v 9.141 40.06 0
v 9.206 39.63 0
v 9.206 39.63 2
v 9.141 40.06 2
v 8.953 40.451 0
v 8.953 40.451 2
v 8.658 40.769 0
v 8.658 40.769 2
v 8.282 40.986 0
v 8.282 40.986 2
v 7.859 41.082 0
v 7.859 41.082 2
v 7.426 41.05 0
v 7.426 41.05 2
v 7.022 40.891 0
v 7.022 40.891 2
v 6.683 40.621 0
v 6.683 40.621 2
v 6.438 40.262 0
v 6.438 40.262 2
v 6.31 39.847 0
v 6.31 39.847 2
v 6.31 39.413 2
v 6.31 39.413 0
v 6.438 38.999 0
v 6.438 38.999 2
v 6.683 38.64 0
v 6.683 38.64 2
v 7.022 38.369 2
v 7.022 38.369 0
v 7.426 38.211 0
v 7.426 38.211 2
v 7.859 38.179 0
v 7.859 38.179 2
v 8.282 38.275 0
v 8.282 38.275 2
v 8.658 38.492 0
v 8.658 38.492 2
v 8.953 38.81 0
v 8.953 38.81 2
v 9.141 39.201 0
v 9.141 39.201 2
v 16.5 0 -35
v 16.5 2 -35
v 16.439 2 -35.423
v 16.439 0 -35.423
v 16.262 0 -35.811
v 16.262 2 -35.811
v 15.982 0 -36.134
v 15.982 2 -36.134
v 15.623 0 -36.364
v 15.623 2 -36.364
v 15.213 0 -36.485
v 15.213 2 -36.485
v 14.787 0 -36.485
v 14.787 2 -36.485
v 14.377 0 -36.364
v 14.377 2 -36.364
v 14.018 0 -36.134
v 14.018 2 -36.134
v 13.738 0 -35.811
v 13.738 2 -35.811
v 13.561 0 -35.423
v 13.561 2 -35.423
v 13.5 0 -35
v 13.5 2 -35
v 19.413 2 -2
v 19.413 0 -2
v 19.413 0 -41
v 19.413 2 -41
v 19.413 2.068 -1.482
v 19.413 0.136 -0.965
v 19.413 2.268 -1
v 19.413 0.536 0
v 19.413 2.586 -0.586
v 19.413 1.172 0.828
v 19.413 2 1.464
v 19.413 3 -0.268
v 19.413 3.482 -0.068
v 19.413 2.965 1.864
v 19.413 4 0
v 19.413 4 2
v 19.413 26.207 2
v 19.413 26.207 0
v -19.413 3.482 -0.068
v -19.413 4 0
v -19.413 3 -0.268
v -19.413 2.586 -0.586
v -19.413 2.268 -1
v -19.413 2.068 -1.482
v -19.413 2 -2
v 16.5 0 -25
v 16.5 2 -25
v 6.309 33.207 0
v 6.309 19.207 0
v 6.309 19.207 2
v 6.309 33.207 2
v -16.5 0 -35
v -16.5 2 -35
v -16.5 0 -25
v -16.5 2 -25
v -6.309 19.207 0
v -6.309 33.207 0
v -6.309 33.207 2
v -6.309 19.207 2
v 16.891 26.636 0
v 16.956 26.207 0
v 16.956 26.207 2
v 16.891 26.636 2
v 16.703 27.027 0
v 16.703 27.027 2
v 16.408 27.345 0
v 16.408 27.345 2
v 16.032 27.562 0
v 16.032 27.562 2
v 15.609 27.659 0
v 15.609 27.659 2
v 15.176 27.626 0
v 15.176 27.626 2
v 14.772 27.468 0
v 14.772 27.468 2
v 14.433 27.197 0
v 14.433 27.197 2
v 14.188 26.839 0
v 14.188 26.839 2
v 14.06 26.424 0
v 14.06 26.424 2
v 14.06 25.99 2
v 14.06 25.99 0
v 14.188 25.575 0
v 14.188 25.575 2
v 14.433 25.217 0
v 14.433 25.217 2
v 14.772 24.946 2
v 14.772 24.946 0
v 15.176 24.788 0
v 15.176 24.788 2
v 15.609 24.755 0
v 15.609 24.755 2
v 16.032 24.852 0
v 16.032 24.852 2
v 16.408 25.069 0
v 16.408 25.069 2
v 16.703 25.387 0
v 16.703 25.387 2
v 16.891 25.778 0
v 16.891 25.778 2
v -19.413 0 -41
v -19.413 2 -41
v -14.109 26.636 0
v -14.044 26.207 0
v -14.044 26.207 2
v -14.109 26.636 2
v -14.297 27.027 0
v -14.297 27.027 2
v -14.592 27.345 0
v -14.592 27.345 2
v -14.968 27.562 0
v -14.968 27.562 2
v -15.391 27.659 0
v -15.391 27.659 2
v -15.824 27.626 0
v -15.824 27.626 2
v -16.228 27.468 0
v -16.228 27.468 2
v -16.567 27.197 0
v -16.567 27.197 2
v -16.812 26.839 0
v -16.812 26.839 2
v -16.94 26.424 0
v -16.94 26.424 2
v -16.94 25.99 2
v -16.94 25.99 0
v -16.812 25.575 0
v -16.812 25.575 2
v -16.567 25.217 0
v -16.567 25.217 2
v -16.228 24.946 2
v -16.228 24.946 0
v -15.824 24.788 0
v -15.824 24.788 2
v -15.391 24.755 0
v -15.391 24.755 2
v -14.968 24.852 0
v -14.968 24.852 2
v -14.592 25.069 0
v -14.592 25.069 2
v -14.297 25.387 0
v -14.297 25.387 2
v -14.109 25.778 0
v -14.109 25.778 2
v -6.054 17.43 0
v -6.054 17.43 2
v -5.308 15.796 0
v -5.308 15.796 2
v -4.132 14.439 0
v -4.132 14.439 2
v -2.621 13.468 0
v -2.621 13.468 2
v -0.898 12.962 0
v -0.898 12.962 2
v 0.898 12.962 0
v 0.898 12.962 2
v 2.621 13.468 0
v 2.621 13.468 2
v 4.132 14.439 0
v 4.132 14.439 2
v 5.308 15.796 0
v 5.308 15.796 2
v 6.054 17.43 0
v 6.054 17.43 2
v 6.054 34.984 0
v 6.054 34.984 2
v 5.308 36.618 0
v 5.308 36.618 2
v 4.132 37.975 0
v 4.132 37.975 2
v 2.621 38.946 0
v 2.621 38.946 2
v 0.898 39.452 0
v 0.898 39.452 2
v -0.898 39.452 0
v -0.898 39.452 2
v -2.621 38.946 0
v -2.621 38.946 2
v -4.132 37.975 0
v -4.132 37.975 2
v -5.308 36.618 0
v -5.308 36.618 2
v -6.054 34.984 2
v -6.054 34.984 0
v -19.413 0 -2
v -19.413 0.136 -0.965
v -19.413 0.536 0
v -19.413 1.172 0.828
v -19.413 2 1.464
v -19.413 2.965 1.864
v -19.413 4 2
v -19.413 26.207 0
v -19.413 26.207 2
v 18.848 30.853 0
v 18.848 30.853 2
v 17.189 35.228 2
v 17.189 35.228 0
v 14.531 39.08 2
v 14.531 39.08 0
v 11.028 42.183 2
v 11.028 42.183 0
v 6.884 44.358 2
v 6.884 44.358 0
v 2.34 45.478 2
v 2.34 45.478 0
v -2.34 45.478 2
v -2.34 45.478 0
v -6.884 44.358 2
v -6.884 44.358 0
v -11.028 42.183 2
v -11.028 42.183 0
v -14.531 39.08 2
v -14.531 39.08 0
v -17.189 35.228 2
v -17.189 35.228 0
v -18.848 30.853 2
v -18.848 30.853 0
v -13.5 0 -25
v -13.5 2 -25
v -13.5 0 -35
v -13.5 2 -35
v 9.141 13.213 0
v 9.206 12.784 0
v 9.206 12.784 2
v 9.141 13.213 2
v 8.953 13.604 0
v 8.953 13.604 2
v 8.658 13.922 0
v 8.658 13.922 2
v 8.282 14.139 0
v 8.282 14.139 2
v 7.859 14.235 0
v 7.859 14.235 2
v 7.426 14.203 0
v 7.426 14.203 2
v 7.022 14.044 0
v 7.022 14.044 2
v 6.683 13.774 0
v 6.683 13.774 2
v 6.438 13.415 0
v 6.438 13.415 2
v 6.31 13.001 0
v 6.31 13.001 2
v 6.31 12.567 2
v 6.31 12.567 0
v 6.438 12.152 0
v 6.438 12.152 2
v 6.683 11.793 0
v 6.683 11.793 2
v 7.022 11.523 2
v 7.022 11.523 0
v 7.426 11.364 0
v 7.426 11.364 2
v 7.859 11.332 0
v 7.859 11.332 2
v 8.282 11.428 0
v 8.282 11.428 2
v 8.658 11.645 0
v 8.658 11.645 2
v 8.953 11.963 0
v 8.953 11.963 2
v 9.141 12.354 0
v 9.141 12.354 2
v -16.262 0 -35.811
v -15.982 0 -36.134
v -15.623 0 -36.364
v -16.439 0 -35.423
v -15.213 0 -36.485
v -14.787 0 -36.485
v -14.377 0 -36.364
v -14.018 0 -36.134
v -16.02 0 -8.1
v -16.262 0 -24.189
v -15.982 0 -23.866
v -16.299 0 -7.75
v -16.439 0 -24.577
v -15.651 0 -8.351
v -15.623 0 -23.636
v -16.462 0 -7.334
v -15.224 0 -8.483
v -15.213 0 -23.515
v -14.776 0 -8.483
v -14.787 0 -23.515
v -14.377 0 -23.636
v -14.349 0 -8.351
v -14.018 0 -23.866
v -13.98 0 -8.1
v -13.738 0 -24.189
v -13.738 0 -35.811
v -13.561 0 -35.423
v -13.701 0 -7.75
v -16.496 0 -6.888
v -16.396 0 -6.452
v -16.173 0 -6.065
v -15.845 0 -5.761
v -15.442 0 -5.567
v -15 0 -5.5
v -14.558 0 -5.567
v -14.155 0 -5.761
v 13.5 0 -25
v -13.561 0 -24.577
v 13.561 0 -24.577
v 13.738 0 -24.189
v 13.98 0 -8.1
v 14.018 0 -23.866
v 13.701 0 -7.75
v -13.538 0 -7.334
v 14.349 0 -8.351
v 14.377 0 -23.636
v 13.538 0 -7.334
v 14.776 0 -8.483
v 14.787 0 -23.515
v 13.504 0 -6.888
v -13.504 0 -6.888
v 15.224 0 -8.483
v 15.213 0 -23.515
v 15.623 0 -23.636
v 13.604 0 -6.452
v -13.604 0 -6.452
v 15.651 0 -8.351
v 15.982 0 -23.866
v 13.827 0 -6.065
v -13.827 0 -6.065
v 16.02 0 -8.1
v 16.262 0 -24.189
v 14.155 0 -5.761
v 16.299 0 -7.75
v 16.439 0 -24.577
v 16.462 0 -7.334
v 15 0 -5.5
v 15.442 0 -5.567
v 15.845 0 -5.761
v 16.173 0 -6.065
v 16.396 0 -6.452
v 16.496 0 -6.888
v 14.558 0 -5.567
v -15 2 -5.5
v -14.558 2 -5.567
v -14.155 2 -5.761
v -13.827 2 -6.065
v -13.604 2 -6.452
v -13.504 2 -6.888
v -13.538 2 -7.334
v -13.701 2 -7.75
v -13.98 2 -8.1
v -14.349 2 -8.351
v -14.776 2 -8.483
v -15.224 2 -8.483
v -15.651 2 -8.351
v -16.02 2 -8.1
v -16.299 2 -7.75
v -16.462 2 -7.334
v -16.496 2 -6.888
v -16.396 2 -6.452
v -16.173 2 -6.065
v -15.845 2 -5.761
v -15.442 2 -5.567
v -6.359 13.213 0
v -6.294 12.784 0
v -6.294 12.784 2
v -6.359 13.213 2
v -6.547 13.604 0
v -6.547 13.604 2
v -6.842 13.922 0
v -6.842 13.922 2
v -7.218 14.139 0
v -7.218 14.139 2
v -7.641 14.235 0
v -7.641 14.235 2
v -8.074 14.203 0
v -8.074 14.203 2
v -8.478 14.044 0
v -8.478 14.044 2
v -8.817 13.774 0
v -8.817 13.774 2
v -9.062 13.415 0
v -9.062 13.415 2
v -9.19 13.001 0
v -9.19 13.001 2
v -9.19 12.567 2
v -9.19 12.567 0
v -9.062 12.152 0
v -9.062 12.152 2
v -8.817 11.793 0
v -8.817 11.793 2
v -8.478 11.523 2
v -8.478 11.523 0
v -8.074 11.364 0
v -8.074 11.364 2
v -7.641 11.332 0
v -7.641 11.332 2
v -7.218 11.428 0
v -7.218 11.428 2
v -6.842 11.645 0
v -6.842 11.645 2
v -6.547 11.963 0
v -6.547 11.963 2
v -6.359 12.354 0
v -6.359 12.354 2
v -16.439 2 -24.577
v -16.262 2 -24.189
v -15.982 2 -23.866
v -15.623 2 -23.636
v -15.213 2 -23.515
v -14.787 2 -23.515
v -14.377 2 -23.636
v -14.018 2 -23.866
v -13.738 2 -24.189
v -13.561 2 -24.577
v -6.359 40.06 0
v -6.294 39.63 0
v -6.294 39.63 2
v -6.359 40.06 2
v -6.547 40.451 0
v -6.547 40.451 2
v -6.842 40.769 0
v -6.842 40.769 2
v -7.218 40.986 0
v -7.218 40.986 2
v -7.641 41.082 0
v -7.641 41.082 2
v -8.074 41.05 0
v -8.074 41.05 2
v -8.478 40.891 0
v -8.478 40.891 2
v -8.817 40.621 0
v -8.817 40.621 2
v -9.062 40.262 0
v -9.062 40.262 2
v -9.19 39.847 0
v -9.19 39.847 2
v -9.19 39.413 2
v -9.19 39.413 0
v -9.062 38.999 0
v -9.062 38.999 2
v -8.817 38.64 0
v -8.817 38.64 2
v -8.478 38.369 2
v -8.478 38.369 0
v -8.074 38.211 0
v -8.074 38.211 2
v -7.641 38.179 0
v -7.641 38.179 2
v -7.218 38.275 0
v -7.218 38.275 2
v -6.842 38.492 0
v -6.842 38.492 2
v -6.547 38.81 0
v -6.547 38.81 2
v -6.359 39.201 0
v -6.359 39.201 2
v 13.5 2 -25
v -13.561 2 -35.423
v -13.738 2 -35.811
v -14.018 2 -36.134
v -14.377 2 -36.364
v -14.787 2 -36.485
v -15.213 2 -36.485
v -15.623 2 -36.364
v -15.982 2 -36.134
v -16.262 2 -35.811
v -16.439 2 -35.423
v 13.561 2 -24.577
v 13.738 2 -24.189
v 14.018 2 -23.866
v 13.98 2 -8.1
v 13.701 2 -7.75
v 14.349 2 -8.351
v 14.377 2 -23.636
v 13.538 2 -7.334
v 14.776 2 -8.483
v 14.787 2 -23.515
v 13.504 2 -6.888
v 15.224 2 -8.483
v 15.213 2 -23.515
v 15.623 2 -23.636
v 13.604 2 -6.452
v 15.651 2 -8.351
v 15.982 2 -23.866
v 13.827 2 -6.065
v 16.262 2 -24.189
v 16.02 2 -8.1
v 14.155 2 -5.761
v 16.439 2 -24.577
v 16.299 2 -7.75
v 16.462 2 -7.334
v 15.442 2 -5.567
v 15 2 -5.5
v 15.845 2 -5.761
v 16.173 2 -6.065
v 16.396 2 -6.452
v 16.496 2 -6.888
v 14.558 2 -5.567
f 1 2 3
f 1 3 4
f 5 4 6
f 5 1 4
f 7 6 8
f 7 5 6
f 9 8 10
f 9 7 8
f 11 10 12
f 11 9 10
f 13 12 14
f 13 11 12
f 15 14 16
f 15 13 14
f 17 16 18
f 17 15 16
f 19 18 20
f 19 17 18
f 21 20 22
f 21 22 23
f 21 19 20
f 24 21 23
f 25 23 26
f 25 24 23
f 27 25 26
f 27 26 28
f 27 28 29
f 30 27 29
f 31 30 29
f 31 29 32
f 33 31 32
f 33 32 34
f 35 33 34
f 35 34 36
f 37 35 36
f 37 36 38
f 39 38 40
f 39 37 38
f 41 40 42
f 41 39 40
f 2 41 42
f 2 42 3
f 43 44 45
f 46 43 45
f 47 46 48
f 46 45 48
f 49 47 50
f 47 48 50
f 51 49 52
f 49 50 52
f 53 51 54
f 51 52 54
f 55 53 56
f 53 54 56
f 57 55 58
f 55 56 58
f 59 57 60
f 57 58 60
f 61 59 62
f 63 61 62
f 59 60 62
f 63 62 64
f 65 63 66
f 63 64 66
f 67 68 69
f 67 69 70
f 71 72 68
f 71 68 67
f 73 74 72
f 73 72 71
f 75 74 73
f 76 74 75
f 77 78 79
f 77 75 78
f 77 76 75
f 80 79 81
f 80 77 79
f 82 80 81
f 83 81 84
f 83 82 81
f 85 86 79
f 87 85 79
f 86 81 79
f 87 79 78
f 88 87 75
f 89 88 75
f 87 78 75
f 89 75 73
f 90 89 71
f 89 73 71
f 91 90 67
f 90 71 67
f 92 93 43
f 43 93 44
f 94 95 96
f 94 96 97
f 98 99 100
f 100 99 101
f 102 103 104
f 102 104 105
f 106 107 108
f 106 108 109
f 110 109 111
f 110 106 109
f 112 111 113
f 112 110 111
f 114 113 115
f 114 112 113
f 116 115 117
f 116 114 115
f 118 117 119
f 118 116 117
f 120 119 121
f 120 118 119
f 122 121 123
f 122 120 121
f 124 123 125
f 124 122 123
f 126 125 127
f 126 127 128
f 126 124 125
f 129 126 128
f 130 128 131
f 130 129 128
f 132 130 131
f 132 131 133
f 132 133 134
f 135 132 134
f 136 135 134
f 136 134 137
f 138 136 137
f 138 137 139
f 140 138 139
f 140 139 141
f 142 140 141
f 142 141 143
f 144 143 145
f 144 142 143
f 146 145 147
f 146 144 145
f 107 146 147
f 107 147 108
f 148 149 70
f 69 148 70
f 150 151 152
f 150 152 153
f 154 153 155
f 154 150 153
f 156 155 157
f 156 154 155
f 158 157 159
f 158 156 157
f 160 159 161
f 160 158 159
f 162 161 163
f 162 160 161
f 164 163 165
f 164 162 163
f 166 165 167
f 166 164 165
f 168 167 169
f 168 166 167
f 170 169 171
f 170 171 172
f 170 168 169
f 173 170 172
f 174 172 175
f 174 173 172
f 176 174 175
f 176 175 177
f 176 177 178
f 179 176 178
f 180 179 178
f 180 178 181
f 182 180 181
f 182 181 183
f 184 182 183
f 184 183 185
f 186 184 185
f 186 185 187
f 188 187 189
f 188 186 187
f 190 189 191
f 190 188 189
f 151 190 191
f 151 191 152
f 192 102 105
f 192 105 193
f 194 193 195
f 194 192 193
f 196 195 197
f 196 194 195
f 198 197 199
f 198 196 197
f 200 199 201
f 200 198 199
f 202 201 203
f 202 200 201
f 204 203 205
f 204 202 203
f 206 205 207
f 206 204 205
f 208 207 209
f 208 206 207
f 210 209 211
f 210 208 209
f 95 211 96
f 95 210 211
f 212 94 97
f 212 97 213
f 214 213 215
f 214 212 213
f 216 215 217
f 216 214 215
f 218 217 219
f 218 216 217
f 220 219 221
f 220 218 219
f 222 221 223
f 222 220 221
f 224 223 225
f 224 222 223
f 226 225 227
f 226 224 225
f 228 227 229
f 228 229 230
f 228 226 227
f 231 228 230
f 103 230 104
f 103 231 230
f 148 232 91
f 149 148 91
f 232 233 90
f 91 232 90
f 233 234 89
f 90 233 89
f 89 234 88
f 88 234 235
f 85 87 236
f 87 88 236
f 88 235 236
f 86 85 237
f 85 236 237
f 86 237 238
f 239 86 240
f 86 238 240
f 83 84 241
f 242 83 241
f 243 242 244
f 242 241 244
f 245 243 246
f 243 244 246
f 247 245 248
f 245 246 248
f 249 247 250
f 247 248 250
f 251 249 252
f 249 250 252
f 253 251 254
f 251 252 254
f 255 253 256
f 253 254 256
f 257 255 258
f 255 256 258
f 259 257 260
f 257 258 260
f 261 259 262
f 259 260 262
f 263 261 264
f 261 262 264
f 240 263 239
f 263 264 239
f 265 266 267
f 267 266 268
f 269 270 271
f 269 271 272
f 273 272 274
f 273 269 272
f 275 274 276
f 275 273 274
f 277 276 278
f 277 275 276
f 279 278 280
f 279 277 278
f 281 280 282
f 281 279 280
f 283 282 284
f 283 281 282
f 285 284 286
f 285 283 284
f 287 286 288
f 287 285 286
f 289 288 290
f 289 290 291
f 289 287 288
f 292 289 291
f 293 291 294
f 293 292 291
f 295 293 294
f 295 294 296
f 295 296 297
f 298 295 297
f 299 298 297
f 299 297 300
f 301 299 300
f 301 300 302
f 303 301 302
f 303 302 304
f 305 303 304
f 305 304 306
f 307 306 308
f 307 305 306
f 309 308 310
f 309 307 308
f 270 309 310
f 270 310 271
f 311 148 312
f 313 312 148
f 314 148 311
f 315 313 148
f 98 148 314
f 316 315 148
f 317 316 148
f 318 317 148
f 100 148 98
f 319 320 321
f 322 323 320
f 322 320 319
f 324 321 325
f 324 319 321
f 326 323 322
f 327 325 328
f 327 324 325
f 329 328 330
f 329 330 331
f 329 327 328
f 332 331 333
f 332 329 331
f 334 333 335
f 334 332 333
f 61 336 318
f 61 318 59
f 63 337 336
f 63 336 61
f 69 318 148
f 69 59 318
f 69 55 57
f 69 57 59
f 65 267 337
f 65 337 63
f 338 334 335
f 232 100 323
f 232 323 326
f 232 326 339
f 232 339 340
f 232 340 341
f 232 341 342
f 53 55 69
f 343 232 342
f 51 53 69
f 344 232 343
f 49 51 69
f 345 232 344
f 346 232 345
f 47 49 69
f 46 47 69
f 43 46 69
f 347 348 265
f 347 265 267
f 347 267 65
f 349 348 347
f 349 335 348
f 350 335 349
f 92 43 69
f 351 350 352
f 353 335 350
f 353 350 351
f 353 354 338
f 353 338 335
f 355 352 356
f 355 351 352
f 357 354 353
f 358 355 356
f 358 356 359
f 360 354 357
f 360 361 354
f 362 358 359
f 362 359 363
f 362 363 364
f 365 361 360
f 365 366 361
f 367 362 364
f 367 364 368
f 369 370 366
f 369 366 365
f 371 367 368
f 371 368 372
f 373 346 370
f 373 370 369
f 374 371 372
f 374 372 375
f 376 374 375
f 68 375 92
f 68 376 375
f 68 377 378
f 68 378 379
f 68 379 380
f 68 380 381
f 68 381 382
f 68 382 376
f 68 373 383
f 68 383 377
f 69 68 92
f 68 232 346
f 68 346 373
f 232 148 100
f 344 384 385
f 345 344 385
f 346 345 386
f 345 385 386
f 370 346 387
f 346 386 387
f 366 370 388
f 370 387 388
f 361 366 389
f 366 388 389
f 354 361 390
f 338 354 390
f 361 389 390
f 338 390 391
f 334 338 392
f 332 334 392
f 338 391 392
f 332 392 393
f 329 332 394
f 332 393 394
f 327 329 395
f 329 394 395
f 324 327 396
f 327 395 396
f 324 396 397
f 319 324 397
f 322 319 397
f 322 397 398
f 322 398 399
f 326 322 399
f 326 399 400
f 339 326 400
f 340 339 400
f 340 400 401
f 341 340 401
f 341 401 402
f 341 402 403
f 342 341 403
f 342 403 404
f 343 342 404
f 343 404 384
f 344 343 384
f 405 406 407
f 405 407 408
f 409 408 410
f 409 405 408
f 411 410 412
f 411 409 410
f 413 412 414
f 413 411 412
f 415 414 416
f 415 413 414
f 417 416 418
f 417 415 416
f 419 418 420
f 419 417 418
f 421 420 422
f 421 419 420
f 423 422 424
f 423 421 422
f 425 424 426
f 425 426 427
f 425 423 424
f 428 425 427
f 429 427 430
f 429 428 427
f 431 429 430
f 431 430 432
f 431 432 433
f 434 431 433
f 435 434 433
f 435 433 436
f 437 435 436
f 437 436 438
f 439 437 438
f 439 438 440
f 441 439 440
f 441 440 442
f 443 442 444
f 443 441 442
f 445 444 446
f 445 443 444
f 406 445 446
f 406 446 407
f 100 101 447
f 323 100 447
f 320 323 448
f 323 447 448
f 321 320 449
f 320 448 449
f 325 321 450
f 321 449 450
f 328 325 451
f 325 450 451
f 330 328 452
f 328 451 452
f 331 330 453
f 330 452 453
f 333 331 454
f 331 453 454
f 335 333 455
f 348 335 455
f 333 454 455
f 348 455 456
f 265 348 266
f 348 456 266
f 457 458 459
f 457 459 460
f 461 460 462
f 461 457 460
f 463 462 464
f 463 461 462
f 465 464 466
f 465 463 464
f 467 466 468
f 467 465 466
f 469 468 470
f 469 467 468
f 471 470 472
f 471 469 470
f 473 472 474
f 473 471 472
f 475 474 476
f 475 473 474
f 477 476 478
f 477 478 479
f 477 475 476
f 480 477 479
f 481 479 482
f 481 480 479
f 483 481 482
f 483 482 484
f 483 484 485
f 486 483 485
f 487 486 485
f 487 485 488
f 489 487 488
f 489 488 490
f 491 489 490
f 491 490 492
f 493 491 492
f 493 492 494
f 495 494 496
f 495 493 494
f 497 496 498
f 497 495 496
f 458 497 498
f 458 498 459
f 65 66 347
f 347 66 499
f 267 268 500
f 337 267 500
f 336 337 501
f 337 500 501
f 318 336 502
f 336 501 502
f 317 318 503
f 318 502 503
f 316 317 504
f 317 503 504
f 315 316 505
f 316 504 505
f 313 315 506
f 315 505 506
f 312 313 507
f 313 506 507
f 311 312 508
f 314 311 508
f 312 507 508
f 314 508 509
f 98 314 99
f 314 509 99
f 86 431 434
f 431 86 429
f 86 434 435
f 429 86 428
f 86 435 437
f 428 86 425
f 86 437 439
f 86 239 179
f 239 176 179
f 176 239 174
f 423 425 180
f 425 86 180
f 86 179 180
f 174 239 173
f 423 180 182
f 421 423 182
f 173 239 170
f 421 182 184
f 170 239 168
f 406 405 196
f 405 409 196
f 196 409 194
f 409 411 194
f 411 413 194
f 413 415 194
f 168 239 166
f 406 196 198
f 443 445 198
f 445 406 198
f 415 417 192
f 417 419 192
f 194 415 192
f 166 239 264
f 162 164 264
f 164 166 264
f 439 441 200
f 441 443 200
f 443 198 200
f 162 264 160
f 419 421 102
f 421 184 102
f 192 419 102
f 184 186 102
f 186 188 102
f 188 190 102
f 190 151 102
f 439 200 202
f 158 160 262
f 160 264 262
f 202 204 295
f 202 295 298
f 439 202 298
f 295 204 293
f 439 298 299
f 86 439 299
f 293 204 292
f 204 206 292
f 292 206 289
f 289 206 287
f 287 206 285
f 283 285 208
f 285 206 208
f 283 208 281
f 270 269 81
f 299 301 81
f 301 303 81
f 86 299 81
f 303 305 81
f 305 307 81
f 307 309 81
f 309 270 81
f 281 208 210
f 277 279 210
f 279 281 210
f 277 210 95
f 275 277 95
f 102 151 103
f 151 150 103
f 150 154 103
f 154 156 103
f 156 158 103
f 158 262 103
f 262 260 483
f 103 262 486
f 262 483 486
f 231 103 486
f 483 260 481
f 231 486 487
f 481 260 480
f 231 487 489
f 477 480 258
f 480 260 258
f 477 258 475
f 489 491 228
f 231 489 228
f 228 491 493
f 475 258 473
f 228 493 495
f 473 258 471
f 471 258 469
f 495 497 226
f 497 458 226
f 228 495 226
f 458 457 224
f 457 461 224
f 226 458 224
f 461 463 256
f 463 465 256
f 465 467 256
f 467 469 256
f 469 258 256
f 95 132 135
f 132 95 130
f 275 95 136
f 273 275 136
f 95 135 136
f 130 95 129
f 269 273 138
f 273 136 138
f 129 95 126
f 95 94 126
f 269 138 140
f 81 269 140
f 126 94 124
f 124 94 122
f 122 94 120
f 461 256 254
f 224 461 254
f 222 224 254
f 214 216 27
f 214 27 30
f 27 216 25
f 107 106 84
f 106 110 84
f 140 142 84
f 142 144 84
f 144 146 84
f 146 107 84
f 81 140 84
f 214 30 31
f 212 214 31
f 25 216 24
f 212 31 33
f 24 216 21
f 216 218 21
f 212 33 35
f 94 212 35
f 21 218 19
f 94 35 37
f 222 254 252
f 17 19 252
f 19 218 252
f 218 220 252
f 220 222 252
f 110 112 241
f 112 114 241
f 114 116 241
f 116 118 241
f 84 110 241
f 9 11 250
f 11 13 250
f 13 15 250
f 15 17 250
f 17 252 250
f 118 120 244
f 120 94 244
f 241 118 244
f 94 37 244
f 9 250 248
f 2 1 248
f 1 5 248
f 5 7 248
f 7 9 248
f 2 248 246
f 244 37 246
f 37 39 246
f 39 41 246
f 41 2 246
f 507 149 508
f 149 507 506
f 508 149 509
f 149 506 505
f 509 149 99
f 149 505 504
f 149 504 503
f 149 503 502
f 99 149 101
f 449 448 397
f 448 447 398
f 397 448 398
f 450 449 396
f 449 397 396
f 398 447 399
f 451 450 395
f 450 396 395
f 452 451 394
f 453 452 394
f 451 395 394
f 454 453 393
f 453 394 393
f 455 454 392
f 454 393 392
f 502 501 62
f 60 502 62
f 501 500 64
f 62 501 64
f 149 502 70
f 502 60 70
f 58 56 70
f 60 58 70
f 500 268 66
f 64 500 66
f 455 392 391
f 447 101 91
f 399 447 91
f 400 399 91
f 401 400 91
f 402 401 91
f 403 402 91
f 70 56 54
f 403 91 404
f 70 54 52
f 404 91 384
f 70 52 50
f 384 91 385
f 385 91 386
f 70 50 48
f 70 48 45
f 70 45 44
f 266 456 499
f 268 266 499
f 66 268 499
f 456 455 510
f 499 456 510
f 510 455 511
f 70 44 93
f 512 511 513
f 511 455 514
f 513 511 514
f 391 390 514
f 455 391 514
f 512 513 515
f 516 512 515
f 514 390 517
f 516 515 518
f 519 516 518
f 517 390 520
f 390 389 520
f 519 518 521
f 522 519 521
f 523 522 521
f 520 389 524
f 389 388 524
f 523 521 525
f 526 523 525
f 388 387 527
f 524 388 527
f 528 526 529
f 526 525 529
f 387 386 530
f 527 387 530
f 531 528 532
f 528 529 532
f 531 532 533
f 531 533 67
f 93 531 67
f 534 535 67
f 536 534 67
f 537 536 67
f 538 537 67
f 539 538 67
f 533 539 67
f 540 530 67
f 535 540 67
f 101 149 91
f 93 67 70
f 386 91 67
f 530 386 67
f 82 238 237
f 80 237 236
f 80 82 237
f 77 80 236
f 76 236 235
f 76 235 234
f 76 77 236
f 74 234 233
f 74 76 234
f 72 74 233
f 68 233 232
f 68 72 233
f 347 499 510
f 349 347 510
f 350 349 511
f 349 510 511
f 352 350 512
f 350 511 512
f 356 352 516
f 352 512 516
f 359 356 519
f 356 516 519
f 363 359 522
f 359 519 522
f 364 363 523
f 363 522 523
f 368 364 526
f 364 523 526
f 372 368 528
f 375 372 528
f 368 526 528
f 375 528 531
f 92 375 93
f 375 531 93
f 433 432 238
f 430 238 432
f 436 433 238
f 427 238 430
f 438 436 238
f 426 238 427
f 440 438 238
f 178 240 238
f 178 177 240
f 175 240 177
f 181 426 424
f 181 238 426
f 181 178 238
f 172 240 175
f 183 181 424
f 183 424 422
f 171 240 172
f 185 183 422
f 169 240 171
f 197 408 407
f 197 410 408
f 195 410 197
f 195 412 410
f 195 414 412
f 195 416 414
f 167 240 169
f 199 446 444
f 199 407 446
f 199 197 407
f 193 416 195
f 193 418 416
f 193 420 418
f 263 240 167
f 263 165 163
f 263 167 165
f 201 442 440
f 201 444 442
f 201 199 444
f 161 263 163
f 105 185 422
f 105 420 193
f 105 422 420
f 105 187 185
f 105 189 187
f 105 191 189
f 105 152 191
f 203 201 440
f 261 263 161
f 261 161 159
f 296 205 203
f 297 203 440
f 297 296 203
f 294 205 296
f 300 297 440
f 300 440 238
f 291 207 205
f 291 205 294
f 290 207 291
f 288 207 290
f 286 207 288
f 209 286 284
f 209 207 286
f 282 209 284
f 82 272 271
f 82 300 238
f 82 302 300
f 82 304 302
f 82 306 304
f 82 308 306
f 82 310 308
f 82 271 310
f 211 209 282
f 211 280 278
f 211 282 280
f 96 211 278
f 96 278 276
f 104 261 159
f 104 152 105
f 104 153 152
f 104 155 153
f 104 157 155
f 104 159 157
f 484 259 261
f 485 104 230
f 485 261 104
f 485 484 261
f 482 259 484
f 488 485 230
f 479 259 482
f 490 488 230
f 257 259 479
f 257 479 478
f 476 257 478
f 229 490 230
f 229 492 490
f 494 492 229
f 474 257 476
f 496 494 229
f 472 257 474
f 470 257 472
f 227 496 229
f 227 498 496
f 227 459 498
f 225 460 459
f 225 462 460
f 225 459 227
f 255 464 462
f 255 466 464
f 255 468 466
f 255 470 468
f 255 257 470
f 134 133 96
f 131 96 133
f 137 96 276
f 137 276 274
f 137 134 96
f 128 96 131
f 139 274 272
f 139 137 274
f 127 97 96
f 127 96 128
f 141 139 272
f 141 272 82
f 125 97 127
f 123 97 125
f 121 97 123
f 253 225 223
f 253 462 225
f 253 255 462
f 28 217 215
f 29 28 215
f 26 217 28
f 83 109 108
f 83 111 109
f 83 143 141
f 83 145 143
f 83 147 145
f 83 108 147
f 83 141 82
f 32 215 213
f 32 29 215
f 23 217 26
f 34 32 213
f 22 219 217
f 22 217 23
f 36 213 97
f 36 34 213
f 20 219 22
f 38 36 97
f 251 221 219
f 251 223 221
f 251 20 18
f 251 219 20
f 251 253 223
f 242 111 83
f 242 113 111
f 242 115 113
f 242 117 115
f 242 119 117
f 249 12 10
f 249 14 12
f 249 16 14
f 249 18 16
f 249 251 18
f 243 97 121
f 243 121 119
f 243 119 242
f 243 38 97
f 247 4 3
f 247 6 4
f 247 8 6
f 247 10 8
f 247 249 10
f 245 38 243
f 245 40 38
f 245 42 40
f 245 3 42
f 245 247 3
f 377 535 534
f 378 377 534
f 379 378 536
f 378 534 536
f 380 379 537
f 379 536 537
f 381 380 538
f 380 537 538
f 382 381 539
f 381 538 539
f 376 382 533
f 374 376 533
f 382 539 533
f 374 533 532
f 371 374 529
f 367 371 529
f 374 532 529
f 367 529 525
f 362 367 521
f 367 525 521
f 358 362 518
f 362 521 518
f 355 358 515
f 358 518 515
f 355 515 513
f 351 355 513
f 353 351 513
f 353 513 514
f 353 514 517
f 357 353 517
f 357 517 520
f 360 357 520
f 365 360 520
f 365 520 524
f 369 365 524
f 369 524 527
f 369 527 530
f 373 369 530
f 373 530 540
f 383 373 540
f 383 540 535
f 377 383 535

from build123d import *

# Parameters (mm, degrees)
SKETCH_2_R          = 1.455943363
EXTRUDE_1_DEPTH     = 2
SKETCH_3_W          = 38.825156346
SKETCH_3_H          = 2
EXTRUDE_2_DEPTH     = 43
SKETCH_4_R          = 1.5
CUT_EXTRUDE_1_DEPTH = 10
FILLET_1_R          = 4
FILLET_2_R          = 2


with BuildPart() as part:
    # 草图2 → 凸台-拉伸1 (new body)
    with BuildSketch(Plane.XY):
        with BuildLine():
            Line((-19.412578173, 26.206980534), (-19.412578173, 0))
            Line((-19.412578173, 0), (19.412578173, 0))
            Line((19.412578173, 0), (19.412578173, 26.206980534))
            ThreePointArc((19.412578173, 26.206980534), (0, 45.619558707), (-19.412578173, 26.206980534))
        make_face()
        with Locations((15.5, 26.206980534)):
            Circle(SKETCH_2_R, mode=Mode.SUBTRACT)
        with Locations((7.75, 12.783586775)):
            Circle(SKETCH_2_R, mode=Mode.SUBTRACT)
        with Locations((-7.75, 12.783586775)):
            Circle(SKETCH_2_R, mode=Mode.SUBTRACT)
        with Locations((-15.5, 26.206980534)):
            Circle(SKETCH_2_R, mode=Mode.SUBTRACT)
        with Locations((-7.75, 39.630374293)):
            Circle(SKETCH_2_R, mode=Mode.SUBTRACT)
        with Locations((7.75, 39.630374293)):
            Circle(SKETCH_2_R, mode=Mode.SUBTRACT)
        with BuildLine():
            Line((-6.309087906, 33.206980534), (-6.309087906, 19.206980534))
            ThreePointArc((-6.309087906, 19.206980534), (0, 12.897892628), (6.309087906, 19.206980534))
            Line((6.309087906, 19.206980534), (6.309087906, 33.206980534))
            ThreePointArc((6.309087906, 33.206980534), (0, 39.51606844), (-6.309087906, 33.206980534))
        make_face(mode=Mode.SUBTRACT)
    extrude(amount=EXTRUDE_1_DEPTH)

    # 草图3 → 凸台-拉伸2 (add)
    with BuildSketch(Plane.XY.offset(2)):
        with Locations((0, 1)):
            Rectangle(SKETCH_3_W, SKETCH_3_H)
    extrude(amount=-EXTRUDE_2_DEPTH)

    # 草图4 → 切除-拉伸1 (cut)
    with BuildSketch(Plane(origin=(0, 2, 0), x_dir=(1, 0, 0), z_dir=(0, 1, 0))):
        with Locations(Location((-15, 7, 0), (0, 0, 270))):
            Circle(SKETCH_4_R)
        with Locations(Location((15, 7, 0), (0, 0, 270))):
            Circle(SKETCH_4_R)
        with BuildLine():
            Line((-16.5, 35), (-16.5, 25))
            ThreePointArc((-16.5, 25), (-15, 23.5), (-13.5, 25))
            Line((-13.5, 25), (-13.5, 35))
            ThreePointArc((-13.5, 35), (-15, 36.5), (-16.5, 35))
        make_face()
        with BuildLine():
            Line((13.5, 35), (13.5, 25))
            ThreePointArc((13.5, 25), (15, 23.5), (16.5, 25))
            Line((16.5, 25), (16.5, 35))
            ThreePointArc((16.5, 35), (15, 36.5), (13.5, 35))
        make_face()
    extrude(amount=-CUT_EXTRUDE_1_DEPTH, mode=Mode.SUBTRACT)

    # 圆角1
    fillet_1_edges = [part.edges().sort_by_distance(p)[0] for p in [
        (0, 0, 2),
    ]]
    fillet(fillet_1_edges, radius=FILLET_1_R)

    # 圆角2
    fillet_2_edges = [part.edges().sort_by_distance(p)[0] for p in [
        (0, 2, 0),
    ]]
    fillet(fillet_2_edges, radius=FILLET_2_R)


solid = part.part
